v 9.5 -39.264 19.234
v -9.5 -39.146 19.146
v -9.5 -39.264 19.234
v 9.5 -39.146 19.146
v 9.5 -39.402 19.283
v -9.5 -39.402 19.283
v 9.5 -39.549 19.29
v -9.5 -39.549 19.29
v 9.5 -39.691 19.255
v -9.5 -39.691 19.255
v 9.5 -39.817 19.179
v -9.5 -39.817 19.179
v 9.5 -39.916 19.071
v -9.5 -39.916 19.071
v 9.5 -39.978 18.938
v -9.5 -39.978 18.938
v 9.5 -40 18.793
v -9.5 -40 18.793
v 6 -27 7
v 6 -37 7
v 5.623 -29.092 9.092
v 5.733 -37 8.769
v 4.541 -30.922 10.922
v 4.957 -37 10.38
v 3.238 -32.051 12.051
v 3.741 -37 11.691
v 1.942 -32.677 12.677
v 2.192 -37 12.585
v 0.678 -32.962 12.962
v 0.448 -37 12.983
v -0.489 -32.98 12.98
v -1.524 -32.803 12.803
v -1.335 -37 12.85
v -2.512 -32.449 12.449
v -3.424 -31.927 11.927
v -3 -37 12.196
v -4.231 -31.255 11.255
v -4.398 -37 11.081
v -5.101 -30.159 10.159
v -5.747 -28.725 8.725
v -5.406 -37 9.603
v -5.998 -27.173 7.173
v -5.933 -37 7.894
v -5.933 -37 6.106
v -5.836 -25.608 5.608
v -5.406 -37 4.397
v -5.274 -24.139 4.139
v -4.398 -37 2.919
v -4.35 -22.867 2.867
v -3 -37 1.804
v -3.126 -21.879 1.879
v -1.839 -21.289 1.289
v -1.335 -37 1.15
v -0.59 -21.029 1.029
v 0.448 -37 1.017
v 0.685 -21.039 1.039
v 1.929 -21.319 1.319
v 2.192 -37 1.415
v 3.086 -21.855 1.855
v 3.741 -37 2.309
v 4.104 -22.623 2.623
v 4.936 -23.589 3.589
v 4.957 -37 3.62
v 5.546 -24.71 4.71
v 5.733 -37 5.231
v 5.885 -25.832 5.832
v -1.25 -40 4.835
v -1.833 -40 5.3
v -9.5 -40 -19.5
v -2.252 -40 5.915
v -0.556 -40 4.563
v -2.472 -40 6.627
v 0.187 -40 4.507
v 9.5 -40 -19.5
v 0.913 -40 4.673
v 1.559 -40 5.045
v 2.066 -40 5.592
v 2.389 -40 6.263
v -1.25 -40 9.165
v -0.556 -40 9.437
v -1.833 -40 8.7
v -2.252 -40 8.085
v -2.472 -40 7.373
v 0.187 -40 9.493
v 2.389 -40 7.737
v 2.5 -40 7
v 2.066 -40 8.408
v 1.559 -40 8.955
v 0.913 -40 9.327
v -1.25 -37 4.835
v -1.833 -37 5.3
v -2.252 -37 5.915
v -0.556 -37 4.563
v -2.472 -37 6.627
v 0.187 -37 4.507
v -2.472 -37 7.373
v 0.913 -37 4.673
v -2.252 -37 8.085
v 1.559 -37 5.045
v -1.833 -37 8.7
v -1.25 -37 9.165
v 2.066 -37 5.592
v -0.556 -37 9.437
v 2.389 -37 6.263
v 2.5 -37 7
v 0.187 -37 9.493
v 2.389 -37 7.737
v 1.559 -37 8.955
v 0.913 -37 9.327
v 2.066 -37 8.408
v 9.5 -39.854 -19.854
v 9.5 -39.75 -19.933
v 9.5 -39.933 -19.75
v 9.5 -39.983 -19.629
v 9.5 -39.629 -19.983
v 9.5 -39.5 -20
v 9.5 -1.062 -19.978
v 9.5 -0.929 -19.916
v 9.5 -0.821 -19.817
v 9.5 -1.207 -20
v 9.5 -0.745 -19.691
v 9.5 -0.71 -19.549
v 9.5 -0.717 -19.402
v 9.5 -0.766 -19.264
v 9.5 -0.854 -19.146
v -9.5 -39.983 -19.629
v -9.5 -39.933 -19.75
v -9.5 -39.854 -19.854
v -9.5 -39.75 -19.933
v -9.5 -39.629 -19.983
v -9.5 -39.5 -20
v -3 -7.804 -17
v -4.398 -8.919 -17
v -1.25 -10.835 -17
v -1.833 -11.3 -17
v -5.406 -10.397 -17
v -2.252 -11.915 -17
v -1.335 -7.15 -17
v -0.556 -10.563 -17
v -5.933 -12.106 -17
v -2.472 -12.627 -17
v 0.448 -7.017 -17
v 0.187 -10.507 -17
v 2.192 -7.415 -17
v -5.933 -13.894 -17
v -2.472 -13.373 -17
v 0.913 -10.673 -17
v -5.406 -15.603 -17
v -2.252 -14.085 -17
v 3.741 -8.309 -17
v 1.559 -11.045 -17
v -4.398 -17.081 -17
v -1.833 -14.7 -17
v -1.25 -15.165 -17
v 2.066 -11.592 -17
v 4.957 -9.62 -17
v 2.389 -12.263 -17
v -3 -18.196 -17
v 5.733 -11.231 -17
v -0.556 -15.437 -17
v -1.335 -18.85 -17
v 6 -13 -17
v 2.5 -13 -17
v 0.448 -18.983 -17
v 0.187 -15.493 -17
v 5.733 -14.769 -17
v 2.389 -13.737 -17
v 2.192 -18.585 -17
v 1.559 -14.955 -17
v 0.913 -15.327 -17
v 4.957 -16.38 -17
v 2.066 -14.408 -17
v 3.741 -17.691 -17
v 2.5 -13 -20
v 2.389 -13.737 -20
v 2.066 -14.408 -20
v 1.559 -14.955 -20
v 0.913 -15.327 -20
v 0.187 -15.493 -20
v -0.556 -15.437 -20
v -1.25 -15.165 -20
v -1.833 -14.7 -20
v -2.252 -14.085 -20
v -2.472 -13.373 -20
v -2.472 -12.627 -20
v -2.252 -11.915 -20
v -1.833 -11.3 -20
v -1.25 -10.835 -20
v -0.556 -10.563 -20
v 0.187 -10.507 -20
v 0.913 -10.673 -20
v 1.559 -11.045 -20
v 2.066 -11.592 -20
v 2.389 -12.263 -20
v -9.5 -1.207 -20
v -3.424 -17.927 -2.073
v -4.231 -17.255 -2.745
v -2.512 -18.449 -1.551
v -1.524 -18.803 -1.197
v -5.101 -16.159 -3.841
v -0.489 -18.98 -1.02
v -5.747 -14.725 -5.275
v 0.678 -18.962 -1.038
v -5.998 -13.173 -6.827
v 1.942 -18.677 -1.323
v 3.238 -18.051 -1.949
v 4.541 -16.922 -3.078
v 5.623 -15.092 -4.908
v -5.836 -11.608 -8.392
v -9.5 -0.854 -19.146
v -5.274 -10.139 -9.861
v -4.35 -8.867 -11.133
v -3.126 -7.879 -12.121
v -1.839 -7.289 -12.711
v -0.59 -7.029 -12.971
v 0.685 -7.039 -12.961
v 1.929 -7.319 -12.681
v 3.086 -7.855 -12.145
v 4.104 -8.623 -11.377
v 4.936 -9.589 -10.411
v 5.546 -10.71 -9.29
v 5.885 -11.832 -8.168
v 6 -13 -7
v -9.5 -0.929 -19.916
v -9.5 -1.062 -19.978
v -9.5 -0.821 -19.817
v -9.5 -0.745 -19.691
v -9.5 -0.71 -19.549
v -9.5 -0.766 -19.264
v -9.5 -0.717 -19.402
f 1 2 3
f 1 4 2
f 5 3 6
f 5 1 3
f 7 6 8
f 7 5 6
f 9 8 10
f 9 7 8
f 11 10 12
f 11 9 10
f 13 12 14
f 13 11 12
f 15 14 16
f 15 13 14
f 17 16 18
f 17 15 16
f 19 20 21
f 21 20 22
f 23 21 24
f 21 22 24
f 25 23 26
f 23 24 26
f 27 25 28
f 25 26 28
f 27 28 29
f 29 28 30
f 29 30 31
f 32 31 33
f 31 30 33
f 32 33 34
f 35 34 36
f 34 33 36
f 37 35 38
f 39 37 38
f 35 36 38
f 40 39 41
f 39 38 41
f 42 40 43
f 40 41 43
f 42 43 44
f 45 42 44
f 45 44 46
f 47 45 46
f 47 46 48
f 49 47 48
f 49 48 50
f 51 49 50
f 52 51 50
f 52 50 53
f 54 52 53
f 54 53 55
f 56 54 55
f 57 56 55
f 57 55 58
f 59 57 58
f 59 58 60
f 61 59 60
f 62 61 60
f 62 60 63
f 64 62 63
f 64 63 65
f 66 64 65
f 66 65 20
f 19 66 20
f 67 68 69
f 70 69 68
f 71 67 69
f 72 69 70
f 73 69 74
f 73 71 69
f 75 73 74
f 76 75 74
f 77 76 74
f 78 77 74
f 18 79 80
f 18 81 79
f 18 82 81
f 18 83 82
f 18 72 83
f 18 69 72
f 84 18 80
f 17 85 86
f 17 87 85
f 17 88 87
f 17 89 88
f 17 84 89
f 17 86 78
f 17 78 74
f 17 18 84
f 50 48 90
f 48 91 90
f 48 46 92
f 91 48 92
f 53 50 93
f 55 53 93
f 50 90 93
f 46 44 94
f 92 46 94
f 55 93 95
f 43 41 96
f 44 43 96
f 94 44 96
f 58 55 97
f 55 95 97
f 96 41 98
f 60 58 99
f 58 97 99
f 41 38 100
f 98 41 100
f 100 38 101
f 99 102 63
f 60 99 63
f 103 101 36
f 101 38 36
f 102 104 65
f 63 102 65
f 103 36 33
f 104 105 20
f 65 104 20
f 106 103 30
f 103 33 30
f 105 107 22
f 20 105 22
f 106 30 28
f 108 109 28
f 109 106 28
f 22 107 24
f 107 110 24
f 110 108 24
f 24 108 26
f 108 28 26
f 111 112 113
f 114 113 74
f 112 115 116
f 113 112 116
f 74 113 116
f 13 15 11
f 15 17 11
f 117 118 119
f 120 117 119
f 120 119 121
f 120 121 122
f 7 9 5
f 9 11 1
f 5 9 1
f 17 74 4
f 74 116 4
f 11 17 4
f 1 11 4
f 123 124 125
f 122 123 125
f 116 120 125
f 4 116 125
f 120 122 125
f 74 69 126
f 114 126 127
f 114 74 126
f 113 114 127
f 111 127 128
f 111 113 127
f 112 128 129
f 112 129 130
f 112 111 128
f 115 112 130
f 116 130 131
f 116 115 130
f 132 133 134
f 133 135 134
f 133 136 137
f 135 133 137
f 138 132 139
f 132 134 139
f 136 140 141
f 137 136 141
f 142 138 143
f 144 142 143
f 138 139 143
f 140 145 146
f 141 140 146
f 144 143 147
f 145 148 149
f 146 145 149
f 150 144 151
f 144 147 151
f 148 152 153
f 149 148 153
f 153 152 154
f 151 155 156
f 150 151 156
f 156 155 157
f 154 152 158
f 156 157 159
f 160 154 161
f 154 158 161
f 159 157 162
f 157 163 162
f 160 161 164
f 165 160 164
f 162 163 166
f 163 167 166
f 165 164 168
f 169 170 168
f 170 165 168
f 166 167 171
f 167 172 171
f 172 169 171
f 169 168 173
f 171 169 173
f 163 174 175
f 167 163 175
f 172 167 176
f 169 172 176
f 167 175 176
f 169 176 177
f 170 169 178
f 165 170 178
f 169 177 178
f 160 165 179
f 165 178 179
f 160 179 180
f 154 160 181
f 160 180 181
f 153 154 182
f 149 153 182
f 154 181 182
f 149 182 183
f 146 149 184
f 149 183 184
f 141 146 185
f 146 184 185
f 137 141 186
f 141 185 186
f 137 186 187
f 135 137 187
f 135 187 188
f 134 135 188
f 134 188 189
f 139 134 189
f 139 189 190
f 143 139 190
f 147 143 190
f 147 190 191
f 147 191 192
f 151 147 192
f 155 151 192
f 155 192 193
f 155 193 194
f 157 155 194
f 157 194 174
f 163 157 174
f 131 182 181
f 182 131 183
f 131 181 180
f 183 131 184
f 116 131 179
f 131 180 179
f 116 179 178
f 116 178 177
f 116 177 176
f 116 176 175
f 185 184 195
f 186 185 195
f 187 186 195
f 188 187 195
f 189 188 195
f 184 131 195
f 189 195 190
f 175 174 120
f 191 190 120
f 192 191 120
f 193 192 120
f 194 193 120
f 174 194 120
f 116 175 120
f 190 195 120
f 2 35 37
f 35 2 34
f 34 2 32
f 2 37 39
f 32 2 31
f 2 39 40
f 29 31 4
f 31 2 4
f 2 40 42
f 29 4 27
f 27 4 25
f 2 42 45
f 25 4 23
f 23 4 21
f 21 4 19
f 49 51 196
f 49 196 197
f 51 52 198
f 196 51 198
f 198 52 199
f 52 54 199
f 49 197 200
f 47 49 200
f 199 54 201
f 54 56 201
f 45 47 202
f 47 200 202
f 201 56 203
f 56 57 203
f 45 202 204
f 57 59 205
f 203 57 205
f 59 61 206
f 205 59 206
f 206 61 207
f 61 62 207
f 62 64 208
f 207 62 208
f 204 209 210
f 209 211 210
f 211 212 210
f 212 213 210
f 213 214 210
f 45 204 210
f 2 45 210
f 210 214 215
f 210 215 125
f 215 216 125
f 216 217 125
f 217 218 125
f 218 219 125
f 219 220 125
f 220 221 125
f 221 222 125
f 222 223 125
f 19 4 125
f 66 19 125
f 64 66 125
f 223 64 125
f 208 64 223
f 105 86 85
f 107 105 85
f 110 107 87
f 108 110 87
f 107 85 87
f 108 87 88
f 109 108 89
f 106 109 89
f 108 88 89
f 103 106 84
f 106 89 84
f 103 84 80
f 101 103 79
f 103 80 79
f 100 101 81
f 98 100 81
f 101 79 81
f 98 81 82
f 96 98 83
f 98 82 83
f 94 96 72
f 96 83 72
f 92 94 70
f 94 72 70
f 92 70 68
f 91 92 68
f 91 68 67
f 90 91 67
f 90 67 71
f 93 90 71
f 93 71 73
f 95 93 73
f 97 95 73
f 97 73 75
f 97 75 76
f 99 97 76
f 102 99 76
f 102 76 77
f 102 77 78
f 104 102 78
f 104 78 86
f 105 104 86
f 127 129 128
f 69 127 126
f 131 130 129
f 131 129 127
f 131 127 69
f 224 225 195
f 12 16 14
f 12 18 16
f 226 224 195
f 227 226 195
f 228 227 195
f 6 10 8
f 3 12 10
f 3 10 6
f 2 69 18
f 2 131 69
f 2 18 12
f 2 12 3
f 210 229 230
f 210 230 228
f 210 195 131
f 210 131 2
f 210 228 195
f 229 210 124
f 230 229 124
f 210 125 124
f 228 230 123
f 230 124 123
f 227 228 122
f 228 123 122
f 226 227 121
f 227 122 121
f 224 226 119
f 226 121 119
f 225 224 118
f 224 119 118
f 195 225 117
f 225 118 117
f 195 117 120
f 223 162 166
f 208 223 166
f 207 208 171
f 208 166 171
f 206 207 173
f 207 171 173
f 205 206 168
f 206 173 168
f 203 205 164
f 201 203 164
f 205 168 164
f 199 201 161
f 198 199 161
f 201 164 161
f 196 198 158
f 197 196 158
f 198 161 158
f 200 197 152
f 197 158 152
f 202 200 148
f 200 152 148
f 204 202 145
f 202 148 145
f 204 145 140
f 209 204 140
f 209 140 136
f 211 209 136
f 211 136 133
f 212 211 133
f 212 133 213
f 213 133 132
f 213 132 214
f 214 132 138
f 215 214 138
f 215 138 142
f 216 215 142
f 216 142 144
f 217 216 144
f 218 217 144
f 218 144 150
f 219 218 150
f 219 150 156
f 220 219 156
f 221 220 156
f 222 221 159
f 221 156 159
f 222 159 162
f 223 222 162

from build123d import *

# Parameters (mm, degrees)
F0_W      = 19
F0_H      = 40
F1_DEPTH  = 40
F3_DEPTH  = 25
F4_R      = 2.5
F5_DEPTH  = 25
F7_START  = -3
F6_R      = 6
F7_DEPTH  = 22
F8_R      = 2.5
F9_DEPTH  = 25
F11_START = -3
F10_R     = 6
F11_DEPTH = 22
F12_R     = 0.5


with BuildPart() as f1:
    # F0 (on Front) → F1 (new body)
    with BuildSketch(Plane.XZ):
        Rectangle(F0_W, F0_H)
    extrude(amount=F1_DEPTH)

    # F2 (on face) → F3 (cut)
    with BuildSketch(Plane.YZ.offset(9.5)):
        Polygon((0, 20), (-40, 20), (0, -20), align=None)
    extrude(amount=-F3_DEPTH, mode=Mode.SUBTRACT)

    # F4 (on face) → F5 (cut)
    with BuildSketch(Plane.XZ.offset(40)):
        with Locations((0, 7)):
            Circle(F4_R)
    extrude(amount=-F5_DEPTH, mode=Mode.SUBTRACT)

    # F6 (on face) → F7 (cut)
    with BuildSketch(Plane.XZ.offset(40).offset(F7_START)):
        with Locations((0, 7)):
            Circle(F6_R)
    extrude(amount=-F7_DEPTH, mode=Mode.SUBTRACT)

    # F8 (on face) → F9 (cut)
    with BuildSketch(Plane(origin=(0, 0, -20), x_dir=(1, 0, 0), z_dir=(0, 0, -1))):
        with Locations((0, 13)):
            Circle(F8_R)
    extrude(amount=-F9_DEPTH, mode=Mode.SUBTRACT)

    # F10 (on face) → F11 (cut)
    with BuildSketch(Plane(origin=(0, 0, -20), x_dir=(1, 0, 0), z_dir=(0, 0, -1)).offset(F11_START)):
        with Locations((0, 13)):
            Circle(F10_R)
    extrude(amount=-F11_DEPTH, mode=Mode.SUBTRACT)

    # F12
    f12_edges = [f1.edges().sort_by_distance(p)[0] for p in [
        (0, -40, 20),
        (0, 0, -20),
        (0, -40, -20),
    ]]
    fillet(f12_edges, radius=F12_R)


solid = f1.part
